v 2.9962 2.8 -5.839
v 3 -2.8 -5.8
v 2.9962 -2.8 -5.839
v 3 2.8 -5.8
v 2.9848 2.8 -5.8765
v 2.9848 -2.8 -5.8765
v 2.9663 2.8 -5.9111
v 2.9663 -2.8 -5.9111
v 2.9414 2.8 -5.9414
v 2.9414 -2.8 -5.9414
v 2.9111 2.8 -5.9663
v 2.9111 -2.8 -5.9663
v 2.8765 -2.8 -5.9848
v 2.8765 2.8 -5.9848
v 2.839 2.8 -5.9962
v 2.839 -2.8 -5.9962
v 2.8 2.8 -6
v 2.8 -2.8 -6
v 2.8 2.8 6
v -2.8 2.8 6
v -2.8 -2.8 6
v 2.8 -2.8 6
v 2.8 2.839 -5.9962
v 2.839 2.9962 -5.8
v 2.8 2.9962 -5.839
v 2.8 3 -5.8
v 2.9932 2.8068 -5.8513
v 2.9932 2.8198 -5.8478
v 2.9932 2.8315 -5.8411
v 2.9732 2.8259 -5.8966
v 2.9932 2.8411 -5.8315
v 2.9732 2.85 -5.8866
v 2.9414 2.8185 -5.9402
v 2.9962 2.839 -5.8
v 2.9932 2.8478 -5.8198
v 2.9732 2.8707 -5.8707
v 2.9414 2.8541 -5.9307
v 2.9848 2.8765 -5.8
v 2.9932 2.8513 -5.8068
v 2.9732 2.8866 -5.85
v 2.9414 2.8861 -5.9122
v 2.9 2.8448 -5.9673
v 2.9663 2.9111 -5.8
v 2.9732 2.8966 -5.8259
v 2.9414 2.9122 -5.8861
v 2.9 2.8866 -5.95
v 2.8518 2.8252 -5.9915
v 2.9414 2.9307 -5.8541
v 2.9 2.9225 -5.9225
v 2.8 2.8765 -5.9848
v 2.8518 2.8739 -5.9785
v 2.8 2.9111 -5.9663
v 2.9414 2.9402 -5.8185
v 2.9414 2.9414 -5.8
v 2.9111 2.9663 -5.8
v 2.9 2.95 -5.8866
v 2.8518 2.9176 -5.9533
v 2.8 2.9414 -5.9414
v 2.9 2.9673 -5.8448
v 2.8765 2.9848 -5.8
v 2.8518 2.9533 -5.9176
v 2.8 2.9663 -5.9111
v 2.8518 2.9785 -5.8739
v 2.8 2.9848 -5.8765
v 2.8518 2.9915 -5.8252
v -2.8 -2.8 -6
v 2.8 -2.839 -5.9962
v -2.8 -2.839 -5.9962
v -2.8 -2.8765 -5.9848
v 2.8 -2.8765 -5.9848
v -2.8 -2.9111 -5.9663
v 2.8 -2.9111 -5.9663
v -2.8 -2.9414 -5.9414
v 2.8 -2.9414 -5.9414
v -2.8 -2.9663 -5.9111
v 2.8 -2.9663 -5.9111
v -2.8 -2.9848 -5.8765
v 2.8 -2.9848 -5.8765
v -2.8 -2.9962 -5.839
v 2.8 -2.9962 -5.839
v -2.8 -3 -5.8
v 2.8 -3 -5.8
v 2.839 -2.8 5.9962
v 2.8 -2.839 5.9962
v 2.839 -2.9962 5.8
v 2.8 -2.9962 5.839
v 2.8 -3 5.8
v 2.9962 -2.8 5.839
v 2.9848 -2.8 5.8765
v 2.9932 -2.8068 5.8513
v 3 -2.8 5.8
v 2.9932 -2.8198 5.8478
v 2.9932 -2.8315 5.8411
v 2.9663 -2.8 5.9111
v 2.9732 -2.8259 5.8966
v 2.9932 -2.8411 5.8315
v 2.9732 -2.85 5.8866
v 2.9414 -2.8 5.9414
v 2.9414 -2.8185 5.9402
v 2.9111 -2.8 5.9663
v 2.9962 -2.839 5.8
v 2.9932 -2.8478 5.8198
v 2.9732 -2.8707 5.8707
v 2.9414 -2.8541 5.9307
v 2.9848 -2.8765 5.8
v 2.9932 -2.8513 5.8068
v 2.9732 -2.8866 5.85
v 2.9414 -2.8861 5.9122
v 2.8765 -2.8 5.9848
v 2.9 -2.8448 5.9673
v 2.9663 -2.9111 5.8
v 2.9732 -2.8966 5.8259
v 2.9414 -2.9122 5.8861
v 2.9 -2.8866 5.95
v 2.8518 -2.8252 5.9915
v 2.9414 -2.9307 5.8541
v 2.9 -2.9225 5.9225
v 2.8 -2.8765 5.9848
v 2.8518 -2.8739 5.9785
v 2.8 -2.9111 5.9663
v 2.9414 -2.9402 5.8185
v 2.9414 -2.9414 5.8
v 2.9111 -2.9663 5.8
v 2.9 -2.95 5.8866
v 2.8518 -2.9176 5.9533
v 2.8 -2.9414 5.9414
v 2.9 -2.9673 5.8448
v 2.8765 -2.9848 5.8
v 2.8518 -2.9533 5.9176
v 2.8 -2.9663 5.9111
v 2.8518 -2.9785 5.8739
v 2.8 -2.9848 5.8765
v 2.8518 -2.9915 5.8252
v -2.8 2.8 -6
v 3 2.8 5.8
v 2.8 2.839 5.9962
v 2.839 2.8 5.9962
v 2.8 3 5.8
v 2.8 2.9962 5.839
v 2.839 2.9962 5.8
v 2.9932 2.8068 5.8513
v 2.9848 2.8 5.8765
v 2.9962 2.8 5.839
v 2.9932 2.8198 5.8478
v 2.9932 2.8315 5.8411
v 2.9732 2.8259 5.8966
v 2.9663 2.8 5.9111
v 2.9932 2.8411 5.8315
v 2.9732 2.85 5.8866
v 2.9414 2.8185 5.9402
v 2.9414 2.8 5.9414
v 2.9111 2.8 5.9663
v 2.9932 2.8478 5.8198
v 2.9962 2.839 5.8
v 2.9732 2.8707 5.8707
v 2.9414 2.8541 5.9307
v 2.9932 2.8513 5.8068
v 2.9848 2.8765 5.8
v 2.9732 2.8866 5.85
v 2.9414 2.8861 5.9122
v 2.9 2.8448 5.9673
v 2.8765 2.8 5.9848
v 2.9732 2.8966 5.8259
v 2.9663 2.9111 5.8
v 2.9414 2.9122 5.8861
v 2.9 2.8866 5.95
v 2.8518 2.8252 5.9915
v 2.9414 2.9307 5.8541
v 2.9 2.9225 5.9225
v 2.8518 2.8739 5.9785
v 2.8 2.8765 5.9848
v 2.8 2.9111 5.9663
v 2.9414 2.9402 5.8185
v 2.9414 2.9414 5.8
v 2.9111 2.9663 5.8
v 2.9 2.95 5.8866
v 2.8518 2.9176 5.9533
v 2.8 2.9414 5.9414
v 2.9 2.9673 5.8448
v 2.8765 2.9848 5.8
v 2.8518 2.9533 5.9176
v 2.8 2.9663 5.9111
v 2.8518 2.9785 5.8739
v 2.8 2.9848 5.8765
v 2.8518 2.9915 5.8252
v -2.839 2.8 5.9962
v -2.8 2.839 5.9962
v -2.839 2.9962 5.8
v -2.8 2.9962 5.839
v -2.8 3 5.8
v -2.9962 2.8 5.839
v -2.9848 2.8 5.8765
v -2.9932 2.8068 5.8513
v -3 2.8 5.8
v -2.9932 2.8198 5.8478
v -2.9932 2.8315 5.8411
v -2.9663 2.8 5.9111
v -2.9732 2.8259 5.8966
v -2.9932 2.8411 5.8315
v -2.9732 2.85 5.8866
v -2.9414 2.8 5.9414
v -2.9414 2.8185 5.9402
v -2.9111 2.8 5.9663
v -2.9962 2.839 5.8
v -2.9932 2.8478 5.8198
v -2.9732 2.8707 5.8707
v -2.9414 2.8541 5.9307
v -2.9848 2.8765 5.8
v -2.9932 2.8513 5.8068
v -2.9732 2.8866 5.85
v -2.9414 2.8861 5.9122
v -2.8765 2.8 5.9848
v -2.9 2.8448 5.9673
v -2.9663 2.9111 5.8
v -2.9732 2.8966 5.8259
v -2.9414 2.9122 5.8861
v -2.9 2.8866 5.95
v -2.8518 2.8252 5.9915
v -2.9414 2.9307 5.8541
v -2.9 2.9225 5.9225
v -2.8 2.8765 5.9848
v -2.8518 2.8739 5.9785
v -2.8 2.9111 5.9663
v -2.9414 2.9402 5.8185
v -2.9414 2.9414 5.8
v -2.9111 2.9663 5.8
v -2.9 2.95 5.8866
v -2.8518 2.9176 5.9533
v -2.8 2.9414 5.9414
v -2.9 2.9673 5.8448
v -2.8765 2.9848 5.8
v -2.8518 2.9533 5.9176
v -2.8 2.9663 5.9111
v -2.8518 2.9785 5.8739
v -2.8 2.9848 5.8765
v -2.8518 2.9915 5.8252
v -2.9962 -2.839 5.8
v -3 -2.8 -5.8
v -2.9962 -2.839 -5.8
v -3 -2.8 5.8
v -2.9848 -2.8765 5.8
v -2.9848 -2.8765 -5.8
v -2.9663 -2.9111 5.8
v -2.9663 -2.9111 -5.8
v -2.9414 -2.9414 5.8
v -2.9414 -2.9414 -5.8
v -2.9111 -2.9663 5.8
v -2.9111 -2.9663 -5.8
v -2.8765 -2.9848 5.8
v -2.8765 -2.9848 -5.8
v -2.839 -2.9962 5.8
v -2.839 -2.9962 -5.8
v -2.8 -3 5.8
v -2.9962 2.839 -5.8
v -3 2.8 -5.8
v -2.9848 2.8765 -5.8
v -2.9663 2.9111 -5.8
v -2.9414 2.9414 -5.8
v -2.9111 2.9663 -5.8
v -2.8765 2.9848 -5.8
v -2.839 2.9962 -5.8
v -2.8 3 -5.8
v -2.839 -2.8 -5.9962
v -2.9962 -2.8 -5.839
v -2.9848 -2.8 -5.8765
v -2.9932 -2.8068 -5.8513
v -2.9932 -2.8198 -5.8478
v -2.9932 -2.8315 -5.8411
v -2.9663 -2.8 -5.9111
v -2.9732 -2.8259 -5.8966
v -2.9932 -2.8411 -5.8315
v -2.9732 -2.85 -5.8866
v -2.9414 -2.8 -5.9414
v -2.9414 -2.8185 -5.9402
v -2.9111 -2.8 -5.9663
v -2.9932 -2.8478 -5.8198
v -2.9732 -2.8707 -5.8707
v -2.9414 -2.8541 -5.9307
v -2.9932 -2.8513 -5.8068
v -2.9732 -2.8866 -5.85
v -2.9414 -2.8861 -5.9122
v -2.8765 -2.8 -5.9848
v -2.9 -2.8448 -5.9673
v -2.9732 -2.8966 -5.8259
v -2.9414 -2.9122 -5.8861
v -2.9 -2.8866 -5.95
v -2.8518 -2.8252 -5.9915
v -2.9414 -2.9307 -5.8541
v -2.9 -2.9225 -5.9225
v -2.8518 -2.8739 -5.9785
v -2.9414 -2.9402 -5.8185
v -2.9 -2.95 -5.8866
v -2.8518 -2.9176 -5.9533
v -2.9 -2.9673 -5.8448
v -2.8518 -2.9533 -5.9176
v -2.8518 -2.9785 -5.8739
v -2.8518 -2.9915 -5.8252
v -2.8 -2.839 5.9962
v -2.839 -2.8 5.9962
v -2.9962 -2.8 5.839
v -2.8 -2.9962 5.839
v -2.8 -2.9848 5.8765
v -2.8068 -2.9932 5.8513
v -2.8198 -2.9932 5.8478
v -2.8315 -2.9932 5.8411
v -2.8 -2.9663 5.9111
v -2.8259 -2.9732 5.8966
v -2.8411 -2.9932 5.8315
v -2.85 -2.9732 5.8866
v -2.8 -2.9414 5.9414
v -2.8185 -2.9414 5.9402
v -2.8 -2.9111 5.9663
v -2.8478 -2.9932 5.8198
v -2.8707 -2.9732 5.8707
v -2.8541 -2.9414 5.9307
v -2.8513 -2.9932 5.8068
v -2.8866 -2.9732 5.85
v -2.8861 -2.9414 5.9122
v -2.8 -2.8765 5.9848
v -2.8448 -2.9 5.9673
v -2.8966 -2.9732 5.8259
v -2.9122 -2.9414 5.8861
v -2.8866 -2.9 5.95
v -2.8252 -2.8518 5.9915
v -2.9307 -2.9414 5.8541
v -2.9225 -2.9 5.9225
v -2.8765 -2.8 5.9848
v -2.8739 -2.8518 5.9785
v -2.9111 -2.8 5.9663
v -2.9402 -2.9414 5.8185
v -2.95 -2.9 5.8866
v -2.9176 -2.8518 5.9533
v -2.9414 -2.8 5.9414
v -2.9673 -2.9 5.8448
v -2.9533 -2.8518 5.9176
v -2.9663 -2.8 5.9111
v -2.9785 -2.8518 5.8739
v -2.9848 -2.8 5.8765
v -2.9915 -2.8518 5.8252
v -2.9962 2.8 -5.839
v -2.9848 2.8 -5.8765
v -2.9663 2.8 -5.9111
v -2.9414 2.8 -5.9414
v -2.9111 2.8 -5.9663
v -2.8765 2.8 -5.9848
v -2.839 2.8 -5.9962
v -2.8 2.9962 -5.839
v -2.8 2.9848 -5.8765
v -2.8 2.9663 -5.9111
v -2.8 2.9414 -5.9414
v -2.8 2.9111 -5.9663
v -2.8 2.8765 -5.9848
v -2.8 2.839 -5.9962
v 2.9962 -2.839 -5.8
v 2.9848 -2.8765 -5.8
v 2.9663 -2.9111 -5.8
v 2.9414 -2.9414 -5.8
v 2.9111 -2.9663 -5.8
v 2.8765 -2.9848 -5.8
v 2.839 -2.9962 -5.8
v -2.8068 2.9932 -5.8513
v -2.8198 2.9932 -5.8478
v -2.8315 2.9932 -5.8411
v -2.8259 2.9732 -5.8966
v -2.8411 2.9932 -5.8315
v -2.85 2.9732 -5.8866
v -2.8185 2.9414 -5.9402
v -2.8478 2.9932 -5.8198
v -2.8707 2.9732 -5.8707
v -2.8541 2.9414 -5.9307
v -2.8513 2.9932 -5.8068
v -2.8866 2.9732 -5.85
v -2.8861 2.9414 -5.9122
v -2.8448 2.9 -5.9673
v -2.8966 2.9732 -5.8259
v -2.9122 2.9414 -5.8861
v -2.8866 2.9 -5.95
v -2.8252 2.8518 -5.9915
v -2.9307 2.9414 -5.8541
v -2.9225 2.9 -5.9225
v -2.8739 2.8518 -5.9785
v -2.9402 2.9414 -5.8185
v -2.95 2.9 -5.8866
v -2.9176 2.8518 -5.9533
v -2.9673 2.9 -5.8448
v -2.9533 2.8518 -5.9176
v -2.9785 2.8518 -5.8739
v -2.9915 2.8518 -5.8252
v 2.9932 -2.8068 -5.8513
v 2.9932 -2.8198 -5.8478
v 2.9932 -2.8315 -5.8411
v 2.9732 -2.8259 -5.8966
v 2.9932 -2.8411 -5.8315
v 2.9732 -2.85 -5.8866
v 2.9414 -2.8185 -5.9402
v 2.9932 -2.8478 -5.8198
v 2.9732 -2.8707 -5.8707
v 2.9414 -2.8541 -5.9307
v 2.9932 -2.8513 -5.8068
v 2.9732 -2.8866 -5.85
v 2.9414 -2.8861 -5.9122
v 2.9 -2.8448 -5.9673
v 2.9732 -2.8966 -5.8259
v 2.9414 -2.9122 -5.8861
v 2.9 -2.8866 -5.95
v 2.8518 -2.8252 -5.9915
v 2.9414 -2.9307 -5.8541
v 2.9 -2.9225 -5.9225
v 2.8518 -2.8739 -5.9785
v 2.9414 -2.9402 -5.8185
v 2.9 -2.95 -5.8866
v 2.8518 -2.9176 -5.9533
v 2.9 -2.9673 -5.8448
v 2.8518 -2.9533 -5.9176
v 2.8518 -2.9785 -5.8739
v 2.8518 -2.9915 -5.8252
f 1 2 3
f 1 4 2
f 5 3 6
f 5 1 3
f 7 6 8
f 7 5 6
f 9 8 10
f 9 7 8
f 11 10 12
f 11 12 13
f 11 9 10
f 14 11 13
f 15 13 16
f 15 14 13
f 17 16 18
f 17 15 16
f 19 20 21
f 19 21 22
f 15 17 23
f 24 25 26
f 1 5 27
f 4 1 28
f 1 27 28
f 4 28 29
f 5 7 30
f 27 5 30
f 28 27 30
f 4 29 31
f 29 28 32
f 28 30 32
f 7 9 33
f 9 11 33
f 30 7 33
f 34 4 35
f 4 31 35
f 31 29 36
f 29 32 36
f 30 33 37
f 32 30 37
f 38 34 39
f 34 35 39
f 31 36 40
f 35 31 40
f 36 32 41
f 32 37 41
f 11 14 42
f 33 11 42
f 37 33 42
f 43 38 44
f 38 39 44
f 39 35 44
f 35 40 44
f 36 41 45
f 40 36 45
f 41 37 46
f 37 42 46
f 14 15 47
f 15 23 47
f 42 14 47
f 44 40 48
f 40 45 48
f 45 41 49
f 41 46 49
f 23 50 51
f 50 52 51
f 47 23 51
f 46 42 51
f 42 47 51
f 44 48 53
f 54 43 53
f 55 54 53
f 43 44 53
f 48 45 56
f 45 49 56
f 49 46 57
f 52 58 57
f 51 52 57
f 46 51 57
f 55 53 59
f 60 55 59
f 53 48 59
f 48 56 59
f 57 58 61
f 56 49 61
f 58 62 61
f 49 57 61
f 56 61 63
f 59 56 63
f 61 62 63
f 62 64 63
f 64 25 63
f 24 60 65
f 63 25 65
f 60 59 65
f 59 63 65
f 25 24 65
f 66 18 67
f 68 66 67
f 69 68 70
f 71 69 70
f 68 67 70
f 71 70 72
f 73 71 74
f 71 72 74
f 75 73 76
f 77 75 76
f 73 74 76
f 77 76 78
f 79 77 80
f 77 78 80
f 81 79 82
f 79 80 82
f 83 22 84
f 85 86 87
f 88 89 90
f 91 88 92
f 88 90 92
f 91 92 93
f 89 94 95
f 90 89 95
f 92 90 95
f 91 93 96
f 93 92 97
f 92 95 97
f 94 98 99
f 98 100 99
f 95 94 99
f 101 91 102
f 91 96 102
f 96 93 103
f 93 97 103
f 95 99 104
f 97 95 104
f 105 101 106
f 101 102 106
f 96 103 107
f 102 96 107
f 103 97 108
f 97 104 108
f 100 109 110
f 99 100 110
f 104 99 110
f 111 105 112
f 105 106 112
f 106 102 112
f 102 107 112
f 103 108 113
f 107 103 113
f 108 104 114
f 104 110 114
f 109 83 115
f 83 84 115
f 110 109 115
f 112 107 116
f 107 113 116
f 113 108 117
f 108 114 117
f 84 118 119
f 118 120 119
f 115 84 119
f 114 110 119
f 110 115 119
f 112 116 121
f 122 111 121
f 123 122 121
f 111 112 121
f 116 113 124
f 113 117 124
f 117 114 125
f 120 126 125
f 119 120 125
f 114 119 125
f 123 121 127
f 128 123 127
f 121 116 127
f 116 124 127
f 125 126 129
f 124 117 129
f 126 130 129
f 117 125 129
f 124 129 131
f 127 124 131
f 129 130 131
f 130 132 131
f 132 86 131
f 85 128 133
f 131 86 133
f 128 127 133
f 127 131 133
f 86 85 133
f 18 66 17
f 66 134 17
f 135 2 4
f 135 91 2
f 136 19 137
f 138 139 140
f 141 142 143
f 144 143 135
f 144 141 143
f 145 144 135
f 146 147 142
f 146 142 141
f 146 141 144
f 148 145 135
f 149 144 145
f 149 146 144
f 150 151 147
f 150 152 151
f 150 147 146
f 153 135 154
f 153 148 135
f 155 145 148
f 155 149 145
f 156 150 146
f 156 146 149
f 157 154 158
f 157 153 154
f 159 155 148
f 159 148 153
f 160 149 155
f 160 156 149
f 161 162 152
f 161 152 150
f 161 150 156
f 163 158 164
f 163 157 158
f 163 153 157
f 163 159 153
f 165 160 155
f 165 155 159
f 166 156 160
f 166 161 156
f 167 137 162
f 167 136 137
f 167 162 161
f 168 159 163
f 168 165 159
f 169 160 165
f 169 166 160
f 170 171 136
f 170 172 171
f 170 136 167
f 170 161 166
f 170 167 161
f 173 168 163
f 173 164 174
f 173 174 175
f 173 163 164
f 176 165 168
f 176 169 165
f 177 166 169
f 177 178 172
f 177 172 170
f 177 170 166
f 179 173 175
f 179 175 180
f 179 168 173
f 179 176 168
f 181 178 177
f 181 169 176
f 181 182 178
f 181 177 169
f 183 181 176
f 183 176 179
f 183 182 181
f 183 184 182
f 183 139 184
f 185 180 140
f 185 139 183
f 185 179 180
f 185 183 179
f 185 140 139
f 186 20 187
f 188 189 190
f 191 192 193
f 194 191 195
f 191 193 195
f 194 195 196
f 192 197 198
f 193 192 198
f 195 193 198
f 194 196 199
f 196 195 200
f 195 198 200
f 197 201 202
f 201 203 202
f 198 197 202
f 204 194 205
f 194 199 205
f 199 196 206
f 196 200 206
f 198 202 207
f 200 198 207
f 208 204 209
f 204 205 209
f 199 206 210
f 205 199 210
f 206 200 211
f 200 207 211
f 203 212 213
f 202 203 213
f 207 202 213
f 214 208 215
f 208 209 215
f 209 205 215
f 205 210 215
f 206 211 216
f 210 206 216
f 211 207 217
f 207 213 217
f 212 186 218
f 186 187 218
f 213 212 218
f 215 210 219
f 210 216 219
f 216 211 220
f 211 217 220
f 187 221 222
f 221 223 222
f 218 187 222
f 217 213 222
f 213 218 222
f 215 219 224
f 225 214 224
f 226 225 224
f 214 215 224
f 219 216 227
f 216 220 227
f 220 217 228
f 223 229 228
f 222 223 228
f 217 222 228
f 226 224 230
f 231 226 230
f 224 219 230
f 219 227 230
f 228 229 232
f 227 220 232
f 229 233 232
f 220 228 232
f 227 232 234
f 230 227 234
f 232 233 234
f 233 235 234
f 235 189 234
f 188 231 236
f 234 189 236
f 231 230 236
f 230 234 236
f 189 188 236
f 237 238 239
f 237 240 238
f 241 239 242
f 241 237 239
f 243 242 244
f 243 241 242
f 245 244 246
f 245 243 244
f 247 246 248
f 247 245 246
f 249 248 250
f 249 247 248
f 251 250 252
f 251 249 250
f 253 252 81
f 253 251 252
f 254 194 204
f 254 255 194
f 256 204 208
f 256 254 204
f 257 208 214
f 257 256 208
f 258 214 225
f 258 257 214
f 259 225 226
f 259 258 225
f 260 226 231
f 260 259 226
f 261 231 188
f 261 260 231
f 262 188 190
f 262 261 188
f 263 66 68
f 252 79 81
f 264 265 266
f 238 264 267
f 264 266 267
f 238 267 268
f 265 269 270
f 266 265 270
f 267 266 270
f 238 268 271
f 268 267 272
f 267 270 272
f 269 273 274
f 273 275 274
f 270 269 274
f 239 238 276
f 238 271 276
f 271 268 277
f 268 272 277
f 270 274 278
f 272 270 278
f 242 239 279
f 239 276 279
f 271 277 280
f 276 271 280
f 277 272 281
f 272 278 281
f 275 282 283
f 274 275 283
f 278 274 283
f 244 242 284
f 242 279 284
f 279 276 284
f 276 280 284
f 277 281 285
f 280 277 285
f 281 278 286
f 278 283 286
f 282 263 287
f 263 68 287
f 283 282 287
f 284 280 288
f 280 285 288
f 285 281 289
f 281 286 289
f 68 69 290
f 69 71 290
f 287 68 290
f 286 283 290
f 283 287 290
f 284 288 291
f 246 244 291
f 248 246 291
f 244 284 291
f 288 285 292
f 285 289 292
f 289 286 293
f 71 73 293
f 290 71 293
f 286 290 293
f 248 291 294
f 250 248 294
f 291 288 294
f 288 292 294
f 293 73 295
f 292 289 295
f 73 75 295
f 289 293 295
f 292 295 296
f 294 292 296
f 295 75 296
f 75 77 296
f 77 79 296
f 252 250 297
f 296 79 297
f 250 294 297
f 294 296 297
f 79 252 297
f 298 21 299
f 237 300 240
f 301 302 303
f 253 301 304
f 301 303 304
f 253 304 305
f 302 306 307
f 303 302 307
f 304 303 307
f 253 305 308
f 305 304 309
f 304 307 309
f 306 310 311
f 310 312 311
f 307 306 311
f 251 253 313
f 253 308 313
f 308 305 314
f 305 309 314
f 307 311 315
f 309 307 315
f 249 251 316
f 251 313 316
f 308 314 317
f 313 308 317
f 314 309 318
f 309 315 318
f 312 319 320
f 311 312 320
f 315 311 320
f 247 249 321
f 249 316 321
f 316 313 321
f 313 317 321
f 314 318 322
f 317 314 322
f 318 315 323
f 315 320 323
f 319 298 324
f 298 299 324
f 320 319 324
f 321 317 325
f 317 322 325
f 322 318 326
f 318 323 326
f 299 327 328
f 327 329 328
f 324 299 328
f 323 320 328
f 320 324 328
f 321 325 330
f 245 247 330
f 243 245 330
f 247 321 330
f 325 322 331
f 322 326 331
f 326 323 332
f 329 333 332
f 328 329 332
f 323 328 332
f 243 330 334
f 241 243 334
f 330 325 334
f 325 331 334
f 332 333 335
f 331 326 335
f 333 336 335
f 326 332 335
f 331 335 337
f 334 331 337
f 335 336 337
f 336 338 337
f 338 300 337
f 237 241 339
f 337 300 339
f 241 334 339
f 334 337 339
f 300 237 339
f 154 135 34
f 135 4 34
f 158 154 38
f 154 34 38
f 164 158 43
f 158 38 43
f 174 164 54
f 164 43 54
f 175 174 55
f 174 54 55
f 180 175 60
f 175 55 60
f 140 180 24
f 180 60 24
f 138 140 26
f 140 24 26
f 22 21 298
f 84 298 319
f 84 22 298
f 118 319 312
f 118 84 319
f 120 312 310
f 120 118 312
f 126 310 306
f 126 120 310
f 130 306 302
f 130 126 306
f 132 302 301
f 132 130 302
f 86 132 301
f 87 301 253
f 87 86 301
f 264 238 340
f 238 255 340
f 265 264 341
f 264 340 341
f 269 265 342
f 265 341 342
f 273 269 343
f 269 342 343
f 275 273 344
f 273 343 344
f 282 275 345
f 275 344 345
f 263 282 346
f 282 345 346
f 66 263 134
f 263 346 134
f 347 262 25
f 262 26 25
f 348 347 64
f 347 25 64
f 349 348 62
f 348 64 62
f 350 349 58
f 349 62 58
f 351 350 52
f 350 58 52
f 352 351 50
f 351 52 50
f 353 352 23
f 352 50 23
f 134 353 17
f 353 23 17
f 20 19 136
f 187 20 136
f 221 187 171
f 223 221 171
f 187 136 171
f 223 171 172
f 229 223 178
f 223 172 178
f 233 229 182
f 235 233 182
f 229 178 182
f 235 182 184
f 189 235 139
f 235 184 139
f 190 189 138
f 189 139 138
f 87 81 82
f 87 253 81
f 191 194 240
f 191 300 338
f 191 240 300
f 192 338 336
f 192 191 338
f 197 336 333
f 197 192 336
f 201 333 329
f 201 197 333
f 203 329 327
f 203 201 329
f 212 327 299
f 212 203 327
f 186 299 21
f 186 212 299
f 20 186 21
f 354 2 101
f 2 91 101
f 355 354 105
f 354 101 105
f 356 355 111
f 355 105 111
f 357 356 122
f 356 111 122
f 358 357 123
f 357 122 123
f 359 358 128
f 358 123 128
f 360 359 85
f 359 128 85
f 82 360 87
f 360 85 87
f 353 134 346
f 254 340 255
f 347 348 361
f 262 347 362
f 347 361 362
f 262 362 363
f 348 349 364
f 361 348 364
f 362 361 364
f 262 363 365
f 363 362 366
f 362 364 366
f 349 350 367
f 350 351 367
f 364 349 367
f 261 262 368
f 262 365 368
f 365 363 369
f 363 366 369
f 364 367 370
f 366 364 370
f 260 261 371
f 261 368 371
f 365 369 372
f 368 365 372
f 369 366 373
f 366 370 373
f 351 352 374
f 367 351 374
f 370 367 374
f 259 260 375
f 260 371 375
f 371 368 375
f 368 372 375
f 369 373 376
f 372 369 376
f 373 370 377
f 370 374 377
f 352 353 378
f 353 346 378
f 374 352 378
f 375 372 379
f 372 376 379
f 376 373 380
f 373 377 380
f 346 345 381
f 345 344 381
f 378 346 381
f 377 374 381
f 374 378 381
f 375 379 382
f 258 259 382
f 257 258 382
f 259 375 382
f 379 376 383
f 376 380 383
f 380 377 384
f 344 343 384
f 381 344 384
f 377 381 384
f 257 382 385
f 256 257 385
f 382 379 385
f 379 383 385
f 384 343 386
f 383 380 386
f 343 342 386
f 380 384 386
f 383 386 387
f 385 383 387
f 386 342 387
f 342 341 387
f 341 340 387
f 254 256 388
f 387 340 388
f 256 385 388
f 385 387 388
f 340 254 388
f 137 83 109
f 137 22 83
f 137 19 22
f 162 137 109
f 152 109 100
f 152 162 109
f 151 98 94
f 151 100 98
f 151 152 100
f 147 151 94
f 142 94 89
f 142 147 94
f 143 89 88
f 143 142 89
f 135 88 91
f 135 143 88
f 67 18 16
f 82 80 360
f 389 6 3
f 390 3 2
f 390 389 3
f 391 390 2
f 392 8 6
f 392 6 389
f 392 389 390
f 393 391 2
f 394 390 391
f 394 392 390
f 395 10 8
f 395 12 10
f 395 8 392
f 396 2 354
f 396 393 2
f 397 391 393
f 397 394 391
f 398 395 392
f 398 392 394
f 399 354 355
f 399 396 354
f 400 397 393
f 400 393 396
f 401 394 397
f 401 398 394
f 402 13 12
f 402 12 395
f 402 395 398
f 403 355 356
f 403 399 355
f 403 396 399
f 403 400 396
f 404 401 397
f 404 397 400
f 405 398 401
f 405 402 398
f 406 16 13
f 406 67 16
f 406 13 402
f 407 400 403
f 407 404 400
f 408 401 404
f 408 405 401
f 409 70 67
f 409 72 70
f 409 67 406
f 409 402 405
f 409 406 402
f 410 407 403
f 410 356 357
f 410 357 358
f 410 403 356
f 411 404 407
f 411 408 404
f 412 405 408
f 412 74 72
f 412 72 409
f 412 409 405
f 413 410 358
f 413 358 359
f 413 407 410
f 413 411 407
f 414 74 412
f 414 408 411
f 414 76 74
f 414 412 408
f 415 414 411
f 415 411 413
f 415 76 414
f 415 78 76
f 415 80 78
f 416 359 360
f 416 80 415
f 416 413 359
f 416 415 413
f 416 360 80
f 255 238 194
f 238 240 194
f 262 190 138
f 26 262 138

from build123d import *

# Parameters (mm, degrees)
SKETCH3_W                = 6
SKETCH3_H                = 6
BOSS_EXTRUDE1_DEPTH      = 6
BOSS_EXTRUDE1_DEPTH_BACK = 6
FILLET2_R                = 0.2


with BuildPart() as part:
    # Sketch3 → Boss-Extrude1 (new body, two sides)
    with BuildSketch(Plane.XY) as boss_extrude1_sk:
        Rectangle(SKETCH3_W, SKETCH3_H)
    extrude(amount=BOSS_EXTRUDE1_DEPTH)
    extrude(boss_extrude1_sk.sketch, amount=-BOSS_EXTRUDE1_DEPTH_BACK)

    # Fillet2
    fillet2_edges = [part.edges().sort_by_distance(p)[0] for p in [
        (0, 3, 6),
        (0, -3, -6),
        (-3, 0, -6),
        (0, 3, -6),
        (3, 0, -6),
        (-3, 0, 6),
        (0, -3, 6),
        (3, 0, 6),
        (-3, -3, 0),
        (-3, 3, 0),
        (3, 3, 0),
        (3, -3, 0),
    ]]
    fillet(fillet2_edges, radius=FILLET2_R)


solid = part.part
